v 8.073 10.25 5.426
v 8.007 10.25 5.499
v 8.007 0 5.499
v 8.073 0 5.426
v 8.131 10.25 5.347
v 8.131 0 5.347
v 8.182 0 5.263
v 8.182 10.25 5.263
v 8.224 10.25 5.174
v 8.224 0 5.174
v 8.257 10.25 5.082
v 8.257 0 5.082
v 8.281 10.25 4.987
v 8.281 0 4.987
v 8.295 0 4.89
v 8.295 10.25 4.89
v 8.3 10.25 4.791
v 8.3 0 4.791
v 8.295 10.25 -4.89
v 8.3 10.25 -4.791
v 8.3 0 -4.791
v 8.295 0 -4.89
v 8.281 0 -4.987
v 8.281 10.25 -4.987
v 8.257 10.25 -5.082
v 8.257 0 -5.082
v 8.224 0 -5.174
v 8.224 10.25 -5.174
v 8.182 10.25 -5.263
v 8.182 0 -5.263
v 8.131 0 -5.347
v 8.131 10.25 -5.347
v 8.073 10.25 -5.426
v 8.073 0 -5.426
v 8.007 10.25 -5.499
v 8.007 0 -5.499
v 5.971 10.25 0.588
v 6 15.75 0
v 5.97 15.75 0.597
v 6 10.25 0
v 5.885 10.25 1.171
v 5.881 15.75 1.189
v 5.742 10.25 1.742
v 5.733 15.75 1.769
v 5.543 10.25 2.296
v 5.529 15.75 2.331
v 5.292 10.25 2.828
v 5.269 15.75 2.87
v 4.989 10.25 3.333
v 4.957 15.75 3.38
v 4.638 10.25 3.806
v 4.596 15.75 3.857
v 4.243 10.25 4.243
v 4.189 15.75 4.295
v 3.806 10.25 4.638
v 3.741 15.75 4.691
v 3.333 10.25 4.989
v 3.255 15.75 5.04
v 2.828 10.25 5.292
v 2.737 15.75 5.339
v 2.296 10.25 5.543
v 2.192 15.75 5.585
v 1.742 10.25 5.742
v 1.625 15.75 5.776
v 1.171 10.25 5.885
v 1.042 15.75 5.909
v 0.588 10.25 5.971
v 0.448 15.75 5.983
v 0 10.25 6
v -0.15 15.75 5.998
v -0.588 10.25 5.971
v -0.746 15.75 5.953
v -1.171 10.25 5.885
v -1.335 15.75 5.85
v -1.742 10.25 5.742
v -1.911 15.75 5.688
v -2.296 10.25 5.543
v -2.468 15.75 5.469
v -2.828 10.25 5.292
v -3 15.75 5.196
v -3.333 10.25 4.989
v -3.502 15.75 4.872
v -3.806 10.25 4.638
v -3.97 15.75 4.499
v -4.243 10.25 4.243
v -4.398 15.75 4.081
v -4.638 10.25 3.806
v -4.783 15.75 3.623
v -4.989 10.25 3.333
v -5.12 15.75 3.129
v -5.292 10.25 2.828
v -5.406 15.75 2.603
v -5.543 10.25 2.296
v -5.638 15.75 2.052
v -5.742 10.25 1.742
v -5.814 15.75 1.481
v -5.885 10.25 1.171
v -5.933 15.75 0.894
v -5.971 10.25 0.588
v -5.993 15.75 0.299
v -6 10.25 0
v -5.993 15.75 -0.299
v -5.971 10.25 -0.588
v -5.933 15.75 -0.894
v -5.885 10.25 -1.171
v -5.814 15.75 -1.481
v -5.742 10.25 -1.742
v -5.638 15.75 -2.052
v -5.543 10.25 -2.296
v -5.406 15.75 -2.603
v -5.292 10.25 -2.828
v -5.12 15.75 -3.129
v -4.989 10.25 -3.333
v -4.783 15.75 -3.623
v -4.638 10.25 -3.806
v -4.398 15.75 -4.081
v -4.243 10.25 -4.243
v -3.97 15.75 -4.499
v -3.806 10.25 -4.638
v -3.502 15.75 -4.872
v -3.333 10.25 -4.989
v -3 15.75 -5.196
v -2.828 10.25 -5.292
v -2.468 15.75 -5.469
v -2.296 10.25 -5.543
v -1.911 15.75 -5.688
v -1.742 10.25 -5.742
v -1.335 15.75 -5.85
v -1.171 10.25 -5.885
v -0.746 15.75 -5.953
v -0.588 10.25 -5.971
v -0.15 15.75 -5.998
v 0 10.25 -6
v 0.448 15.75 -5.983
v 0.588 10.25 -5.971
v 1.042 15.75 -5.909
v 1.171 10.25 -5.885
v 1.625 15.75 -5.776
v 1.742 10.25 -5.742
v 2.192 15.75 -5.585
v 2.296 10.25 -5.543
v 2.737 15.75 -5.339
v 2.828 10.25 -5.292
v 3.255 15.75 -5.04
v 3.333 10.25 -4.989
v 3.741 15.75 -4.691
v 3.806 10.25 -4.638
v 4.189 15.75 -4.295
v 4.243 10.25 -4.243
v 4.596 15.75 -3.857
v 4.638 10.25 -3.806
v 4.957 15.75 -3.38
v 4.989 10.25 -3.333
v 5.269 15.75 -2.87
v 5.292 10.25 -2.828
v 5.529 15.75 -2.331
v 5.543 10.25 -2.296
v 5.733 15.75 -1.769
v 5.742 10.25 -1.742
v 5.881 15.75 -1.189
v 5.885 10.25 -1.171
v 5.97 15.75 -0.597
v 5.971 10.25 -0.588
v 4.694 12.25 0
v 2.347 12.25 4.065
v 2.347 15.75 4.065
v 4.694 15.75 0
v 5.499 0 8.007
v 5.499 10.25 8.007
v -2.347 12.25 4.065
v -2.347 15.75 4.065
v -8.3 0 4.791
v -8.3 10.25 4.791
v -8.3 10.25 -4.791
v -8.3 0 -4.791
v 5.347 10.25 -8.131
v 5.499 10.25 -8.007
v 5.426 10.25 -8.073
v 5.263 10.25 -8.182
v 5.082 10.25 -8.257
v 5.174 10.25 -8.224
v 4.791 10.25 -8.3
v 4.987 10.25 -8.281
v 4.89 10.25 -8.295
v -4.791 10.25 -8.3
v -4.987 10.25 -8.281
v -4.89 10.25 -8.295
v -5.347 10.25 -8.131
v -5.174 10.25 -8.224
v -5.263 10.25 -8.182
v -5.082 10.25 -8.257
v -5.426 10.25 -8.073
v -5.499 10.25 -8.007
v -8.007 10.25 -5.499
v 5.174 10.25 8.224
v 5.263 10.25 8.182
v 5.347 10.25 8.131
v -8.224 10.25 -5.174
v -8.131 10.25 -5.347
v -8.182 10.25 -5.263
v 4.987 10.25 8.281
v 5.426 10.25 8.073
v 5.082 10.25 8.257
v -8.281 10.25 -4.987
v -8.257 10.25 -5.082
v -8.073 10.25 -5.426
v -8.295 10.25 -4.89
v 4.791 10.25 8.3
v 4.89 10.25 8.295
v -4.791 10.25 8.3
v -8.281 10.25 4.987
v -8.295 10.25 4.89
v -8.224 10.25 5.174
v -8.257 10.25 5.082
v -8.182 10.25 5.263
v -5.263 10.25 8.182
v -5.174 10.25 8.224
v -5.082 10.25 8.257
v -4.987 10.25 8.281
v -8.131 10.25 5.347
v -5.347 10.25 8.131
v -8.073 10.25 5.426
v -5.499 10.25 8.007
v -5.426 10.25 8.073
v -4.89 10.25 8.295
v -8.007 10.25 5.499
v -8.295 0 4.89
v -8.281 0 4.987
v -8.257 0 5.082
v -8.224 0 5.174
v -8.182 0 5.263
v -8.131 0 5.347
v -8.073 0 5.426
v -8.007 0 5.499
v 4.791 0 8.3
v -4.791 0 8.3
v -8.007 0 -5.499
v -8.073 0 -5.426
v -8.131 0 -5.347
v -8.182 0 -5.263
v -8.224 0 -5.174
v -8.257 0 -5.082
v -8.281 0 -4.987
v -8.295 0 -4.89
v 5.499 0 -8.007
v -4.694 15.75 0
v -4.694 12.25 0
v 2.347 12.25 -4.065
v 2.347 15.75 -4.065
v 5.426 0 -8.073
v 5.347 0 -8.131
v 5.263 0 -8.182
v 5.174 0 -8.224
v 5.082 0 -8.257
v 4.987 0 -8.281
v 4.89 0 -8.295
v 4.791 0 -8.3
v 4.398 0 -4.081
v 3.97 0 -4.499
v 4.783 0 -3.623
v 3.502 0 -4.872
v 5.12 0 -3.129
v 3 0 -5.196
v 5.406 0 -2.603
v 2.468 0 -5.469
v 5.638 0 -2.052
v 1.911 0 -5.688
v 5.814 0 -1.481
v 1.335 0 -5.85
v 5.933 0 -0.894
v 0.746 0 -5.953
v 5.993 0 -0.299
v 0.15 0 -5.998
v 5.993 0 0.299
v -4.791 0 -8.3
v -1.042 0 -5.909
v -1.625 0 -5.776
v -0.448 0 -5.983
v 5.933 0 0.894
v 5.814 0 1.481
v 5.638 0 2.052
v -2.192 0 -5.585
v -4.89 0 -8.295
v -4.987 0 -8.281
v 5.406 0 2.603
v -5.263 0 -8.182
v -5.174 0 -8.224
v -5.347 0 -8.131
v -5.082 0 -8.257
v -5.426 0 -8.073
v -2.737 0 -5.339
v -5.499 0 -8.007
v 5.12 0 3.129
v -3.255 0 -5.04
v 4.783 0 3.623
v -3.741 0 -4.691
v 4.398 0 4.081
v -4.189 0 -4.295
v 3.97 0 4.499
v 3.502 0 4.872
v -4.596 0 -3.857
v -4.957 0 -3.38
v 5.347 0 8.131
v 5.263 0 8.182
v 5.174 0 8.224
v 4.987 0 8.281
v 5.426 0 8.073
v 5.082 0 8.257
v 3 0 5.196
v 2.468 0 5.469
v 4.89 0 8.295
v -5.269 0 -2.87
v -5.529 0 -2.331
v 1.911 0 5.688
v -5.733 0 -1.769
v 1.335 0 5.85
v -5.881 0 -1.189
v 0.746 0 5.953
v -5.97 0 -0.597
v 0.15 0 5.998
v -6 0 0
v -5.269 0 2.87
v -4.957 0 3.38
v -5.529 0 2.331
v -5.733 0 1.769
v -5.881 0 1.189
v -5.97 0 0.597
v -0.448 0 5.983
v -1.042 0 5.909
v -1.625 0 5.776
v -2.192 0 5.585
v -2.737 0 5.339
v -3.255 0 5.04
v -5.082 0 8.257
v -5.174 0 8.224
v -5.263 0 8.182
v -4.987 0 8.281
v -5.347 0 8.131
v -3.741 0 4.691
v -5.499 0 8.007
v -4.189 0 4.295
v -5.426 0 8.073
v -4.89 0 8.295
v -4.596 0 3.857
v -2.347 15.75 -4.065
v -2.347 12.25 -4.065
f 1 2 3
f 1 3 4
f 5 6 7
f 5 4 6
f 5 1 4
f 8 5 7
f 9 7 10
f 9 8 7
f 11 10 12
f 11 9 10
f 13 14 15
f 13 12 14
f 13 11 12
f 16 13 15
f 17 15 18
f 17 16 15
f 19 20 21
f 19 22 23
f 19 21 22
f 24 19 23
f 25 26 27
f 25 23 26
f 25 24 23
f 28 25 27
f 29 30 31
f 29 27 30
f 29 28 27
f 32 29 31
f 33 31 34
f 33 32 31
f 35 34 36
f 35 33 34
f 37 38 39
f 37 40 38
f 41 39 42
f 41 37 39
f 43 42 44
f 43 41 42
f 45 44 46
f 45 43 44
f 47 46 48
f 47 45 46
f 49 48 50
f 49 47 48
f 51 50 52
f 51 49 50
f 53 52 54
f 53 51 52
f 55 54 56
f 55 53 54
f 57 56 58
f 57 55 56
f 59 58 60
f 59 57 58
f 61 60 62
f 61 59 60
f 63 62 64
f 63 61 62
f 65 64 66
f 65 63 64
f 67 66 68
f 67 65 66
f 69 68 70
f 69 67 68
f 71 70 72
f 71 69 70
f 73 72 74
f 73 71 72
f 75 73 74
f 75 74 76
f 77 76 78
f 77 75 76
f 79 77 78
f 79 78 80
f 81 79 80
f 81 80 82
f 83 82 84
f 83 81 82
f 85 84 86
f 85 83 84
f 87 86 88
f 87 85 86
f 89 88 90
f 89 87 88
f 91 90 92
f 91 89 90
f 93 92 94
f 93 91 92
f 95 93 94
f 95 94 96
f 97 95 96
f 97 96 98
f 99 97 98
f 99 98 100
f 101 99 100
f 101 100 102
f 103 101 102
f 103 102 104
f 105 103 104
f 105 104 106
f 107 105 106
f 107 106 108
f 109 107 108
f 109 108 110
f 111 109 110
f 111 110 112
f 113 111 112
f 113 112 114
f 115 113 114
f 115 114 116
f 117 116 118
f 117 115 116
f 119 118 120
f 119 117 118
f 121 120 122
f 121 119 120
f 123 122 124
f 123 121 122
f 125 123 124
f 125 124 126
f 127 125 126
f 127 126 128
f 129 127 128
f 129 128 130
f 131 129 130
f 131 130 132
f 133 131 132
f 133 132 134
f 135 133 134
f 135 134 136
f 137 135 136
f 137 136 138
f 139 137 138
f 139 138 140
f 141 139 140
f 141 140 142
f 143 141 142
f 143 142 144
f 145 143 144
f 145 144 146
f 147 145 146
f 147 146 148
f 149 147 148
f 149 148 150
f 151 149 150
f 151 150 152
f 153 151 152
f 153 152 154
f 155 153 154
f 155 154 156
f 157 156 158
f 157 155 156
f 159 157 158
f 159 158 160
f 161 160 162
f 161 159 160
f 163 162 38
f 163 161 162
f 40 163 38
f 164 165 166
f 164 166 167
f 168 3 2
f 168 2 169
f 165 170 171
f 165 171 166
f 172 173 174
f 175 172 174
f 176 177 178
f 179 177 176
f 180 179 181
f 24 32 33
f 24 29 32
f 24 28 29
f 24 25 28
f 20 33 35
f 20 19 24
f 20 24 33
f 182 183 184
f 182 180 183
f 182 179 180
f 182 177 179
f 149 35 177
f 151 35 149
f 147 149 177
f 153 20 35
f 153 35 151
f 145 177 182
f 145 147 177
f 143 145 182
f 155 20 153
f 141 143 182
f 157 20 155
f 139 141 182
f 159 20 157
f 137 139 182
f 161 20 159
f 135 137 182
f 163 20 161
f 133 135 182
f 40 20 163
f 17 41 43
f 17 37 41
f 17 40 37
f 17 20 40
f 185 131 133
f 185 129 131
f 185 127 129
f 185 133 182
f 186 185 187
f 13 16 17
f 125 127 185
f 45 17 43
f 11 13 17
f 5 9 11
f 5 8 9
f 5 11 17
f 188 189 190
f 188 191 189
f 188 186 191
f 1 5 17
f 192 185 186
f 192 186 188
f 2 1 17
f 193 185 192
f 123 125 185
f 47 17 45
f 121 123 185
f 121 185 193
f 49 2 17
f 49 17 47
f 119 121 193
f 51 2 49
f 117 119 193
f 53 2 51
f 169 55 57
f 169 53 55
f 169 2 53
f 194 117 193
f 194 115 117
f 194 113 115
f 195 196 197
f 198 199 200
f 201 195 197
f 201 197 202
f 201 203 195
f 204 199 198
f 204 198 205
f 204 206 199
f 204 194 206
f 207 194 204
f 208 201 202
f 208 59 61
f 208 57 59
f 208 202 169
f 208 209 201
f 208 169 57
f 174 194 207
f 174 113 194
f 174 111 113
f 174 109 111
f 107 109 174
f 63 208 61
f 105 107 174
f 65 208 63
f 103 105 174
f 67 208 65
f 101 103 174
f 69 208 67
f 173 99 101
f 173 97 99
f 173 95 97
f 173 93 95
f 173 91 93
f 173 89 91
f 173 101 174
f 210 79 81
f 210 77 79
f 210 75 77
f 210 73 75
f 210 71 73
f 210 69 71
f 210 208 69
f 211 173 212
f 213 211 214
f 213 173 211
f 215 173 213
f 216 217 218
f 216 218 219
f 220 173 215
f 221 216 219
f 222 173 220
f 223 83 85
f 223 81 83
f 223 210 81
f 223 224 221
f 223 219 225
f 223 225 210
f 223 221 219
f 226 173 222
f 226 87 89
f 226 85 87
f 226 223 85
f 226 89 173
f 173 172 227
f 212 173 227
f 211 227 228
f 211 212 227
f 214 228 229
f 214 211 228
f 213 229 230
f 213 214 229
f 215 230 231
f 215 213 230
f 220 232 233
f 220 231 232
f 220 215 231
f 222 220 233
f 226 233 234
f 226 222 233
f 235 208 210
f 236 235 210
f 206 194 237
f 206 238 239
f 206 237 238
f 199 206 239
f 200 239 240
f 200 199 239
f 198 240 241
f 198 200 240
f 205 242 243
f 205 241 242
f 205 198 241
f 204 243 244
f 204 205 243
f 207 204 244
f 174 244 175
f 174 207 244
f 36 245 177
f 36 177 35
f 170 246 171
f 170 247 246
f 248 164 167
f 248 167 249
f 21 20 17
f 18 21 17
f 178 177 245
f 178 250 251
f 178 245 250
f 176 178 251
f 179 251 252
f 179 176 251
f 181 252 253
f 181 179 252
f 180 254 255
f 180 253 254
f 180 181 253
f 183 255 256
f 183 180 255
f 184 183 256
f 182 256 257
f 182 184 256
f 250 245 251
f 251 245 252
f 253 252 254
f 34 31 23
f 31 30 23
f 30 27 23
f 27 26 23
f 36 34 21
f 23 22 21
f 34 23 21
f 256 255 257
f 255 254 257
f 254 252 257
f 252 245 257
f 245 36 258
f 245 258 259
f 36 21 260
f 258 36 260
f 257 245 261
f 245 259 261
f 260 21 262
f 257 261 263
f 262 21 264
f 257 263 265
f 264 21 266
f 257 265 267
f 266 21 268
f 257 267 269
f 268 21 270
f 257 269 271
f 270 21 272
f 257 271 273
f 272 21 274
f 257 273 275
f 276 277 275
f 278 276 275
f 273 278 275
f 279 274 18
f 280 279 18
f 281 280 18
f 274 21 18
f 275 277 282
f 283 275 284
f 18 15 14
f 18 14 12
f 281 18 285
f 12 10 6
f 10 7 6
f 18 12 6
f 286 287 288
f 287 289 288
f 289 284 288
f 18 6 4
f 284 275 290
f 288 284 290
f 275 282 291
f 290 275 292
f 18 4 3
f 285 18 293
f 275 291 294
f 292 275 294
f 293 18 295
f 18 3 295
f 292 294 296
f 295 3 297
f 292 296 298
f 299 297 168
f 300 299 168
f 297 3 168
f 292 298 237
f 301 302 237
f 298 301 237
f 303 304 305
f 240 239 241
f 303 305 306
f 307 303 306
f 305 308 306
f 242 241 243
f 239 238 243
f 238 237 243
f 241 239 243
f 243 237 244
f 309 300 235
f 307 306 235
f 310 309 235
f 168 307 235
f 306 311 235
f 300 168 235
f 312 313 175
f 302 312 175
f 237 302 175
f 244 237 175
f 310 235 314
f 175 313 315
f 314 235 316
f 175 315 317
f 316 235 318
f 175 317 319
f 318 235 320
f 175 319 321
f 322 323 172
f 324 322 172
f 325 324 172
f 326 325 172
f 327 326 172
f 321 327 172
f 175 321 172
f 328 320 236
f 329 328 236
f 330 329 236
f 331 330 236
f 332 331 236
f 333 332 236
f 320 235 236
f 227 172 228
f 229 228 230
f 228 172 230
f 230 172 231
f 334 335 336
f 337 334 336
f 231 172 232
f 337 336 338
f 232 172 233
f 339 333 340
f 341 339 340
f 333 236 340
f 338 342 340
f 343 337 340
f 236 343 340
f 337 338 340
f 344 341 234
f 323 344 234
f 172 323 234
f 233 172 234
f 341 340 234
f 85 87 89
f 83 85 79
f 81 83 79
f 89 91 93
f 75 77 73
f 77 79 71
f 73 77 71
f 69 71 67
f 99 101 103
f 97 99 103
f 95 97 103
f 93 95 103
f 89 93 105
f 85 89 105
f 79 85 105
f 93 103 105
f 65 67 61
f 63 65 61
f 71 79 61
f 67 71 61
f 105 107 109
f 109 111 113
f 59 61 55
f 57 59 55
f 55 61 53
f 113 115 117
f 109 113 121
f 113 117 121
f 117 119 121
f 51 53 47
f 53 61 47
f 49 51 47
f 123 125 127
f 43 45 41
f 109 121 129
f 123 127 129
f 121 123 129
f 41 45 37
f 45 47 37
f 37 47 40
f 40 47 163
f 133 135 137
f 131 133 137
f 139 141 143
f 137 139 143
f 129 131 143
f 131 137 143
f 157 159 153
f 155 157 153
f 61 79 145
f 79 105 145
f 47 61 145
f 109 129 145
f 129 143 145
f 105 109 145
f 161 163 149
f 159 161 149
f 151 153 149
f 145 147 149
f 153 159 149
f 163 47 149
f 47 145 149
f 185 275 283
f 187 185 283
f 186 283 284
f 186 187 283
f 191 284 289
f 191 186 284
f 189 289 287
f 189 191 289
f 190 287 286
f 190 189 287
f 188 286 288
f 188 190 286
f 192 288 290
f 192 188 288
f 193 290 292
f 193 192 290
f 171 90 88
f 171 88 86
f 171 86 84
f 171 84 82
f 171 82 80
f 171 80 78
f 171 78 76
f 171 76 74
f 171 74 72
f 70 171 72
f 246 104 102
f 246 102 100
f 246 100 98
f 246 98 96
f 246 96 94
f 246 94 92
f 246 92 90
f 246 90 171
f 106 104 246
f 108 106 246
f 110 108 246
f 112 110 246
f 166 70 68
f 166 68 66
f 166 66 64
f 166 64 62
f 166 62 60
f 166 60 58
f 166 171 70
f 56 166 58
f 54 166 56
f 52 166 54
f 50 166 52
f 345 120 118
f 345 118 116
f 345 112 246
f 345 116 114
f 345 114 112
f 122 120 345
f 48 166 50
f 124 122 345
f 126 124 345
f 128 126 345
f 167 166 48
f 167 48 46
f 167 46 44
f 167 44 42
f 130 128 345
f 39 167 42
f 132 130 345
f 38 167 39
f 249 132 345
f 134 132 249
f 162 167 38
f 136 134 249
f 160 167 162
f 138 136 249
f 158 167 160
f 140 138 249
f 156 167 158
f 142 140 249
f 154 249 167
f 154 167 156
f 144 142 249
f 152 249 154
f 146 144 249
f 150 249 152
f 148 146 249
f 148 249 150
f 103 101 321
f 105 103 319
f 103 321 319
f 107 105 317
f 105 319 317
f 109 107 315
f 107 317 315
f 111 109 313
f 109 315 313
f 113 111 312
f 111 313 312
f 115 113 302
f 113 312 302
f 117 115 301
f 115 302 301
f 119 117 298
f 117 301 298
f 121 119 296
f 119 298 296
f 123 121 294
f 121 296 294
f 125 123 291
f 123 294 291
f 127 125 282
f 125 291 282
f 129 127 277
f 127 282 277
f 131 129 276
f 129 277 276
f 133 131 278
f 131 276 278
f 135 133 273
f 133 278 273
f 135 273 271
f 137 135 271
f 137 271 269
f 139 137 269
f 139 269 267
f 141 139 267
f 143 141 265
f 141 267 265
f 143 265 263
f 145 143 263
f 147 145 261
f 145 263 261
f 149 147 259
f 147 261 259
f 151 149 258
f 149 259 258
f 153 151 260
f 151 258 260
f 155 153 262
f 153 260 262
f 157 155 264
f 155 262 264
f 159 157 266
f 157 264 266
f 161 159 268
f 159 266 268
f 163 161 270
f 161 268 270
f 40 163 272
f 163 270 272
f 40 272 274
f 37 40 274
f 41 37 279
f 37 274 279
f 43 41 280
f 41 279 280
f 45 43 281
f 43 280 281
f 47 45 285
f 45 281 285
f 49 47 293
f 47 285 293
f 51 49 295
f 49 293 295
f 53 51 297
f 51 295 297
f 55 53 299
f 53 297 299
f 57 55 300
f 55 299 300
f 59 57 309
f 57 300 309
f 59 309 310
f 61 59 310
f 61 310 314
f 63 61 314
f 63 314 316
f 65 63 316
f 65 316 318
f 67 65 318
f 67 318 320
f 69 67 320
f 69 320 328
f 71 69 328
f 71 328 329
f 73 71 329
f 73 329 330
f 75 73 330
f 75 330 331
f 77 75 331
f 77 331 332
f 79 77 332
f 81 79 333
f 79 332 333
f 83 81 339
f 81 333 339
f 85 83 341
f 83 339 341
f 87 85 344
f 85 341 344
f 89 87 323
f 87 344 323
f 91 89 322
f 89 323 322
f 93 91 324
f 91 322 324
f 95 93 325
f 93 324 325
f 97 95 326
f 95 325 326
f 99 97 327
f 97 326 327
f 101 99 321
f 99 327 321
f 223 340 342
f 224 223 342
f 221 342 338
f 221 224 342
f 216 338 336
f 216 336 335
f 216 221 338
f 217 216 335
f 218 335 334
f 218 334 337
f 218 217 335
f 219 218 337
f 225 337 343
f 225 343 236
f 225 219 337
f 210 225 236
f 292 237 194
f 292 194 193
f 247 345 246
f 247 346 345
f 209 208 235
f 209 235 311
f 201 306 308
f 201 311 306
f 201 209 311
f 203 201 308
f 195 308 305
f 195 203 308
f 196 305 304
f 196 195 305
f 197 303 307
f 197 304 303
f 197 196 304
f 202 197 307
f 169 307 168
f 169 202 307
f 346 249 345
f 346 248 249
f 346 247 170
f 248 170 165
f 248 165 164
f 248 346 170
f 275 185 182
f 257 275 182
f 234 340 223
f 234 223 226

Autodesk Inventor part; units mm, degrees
ref_plane "YZ Plane" through (0, 0, 0) normal (1, 0, 0) x (0, 1, 0)
ref_plane "XZ Plane" through (0, 0, 0) normal (0, 1, 0) x (-1, 0, 0)
ref_plane "XY Plane" through (0, 0, 0) normal (0, 0, 1) x (1, 0, 0)
sketch "Sketch1" plane through (0, 0, 0) normal (0, 1, 0) x (-1, 0, 0)
  circle A0 centre (0, 0) radius 6
  line L0 (5.2886, 8.5) -> (-5.2886, 8.5)
  line L1 (-8.5, 5.2886) -> (-8.5, -5.2886)
  line L2 (-5.2886, -8.5) -> (5.2886, -8.5)
  line L3 (8.5, -5.2886) -> (8.5, 5.2886)
  line L4 (8.5, 8.5) -> (-8.5, -8.5) construction
  line L5 (-8.5, 8.5) -> (8.5, -8.5) construction
  line L6 (-6.8943, -6.8943) -> (6.8943, 6.8943)
  line L7 (8.5, 5.2886) -> (5.2886, 8.5)
  line L8 (-5.2886, -8.5) -> (-8.5, -5.2886)
  line L9 (0, 0) -> (2.4857, 0)
  line L10 (8.5, -5.2886) -> (5.2886, -8.5)
  line L11 (-5.2886, 8.5) -> (-8.5, 5.2886)
  line L12 (8.3, 5.2057) -> (8.3, -5.2057)
  line L13 (8.3, -5.2057) -> (5.2057, -8.3)
  line L14 (5.2057, -8.3) -> (-5.2057, -8.3)
  line L15 (-5.2057, -8.3) -> (-8.3, -5.2057)
  line L16 (-8.3, -5.2057) -> (-8.3, 5.2057)
  line L17 (-8.3, 5.2057) -> (-5.2057, 8.3)
  line L18 (-5.2057, 8.3) -> (5.2057, 8.3)
  line L19 (5.2057, 8.3) -> (8.3, 5.2057)
  dimension "d0" = 12
  dimension "d2" = 17
  dimension "d3" = 19.5
  dimension "d4" = 17
  dimension "d5" = 0.2
extrude "Extrusion1" add sketch "Sketch1" along normal blind 10.25 contours A0 L6 L19 L12 L13 L14 L15 | A0 L6 L15 L16 L17 L18 L19
fillet "Fillet1" radius 1 8 edges at (-5.2057, 5.125, 8.3) (5.2057, 5.125, 8.3) (8.3, 5.125, 5.2057) (8.3, 5.125, -5.2057) (5.2057, 5.125, -8.3) (-5.2057, 5.125, -8.3) (-8.3, 5.125, 5.2057) (-8.3, 5.125, -5.2057)
sketch "Sketch2" plane through (0, 10.25, 0) normal (0, 1, 0) x (1, 0, 0)
  line L0 (4.5207, 0) -> (2.2603, -3.915)
  line L1 (2.2603, -3.915) -> (-2.2603, -3.915)
  line L2 (-2.2603, -3.915) -> (-4.5207, 0)
  line L3 (-4.5207, 0) -> (-2.2603, 3.915)
  line L4 (-2.2603, 3.915) -> (2.2603, 3.915)
  line L5 (2.2603, 3.915) -> (4.5207, 0)
  line L6 (2.3469, -4.065) -> (4.6939, 0)
  line L7 (4.6939, 0) -> (2.3469, 4.065)
  line L8 (2.3469, 4.065) -> (-2.3469, 4.065)
  line L9 (-2.3469, 4.065) -> (-4.6939, 0)
  line L10 (-4.6939, 0) -> (-2.3469, -4.065)
  line L11 (-2.3469, -4.065) -> (2.3469, -4.065)
  circle A0 centre (0, 0) radius 3.5
  arc A1 (-8.0071, 5.4986) -> (-8.3, 4.7915) centre (-7.3, 4.7915) ccw projected
  line L12 (-8.3, 4.7915) -> (-8.3, -4.7915) projected
  arc A2 (-8.3, -4.7915) -> (-8.0071, -5.4986) centre (-7.3, -4.7915) ccw projected
  line L13 (-8.0071, -5.4986) -> (-5.4986, -8.0071) projected
  arc A3 (-5.4986, -8.0071) -> (-4.7915, -8.3) centre (-4.7915, -7.3) ccw projected
  line L14 (-4.7915, -8.3) -> (4.7915, -8.3) projected
  arc A4 (4.7915, -8.3) -> (5.4986, -8.0071) centre (4.7915, -7.3) ccw projected
  line L15 (5.4986, -8.0071) -> (8.0071, -5.4986) projected
  arc A5 (8.0071, -5.4986) -> (8.3, -4.7915) centre (7.3, -4.7915) ccw projected
  line L16 (8.3, -4.7915) -> (8.3, 4.7915) projected
  arc A6 (8.3, 4.7915) -> (8.0071, 5.4986) centre (7.3, 4.7915) ccw projected
  line L17 (8.0071, 5.4986) -> (5.4986, 8.0071) projected
  arc A7 (5.4986, 8.0071) -> (4.7915, 8.3) centre (4.7915, 7.3) ccw projected
  line L18 (4.7915, 8.3) -> (-4.7915, 8.3) projected
  arc A8 (-4.7915, 8.3) -> (-5.4986, 8.0071) centre (-4.7915, 7.3) ccw projected
  line L19 (-5.4986, 8.0071) -> (-8.0071, 5.4986) projected
  circle A9 centre (0, 0) radius 6 projected
  dimension "d9" = 7.83
  dimension "d10" = 0.15
  dimension "d11" = 7
extrude "Extrusion2" add sketch "Sketch2" along normal blind 5.5 contours A9
extrude "Extrusion3" add sketch "Sketch2" along normal blind 2 contours L0 L1 L2 L3 L4 L5 | L11 L10 L9 L8 L7 L6 | A0
properties part number "newAdapter"
